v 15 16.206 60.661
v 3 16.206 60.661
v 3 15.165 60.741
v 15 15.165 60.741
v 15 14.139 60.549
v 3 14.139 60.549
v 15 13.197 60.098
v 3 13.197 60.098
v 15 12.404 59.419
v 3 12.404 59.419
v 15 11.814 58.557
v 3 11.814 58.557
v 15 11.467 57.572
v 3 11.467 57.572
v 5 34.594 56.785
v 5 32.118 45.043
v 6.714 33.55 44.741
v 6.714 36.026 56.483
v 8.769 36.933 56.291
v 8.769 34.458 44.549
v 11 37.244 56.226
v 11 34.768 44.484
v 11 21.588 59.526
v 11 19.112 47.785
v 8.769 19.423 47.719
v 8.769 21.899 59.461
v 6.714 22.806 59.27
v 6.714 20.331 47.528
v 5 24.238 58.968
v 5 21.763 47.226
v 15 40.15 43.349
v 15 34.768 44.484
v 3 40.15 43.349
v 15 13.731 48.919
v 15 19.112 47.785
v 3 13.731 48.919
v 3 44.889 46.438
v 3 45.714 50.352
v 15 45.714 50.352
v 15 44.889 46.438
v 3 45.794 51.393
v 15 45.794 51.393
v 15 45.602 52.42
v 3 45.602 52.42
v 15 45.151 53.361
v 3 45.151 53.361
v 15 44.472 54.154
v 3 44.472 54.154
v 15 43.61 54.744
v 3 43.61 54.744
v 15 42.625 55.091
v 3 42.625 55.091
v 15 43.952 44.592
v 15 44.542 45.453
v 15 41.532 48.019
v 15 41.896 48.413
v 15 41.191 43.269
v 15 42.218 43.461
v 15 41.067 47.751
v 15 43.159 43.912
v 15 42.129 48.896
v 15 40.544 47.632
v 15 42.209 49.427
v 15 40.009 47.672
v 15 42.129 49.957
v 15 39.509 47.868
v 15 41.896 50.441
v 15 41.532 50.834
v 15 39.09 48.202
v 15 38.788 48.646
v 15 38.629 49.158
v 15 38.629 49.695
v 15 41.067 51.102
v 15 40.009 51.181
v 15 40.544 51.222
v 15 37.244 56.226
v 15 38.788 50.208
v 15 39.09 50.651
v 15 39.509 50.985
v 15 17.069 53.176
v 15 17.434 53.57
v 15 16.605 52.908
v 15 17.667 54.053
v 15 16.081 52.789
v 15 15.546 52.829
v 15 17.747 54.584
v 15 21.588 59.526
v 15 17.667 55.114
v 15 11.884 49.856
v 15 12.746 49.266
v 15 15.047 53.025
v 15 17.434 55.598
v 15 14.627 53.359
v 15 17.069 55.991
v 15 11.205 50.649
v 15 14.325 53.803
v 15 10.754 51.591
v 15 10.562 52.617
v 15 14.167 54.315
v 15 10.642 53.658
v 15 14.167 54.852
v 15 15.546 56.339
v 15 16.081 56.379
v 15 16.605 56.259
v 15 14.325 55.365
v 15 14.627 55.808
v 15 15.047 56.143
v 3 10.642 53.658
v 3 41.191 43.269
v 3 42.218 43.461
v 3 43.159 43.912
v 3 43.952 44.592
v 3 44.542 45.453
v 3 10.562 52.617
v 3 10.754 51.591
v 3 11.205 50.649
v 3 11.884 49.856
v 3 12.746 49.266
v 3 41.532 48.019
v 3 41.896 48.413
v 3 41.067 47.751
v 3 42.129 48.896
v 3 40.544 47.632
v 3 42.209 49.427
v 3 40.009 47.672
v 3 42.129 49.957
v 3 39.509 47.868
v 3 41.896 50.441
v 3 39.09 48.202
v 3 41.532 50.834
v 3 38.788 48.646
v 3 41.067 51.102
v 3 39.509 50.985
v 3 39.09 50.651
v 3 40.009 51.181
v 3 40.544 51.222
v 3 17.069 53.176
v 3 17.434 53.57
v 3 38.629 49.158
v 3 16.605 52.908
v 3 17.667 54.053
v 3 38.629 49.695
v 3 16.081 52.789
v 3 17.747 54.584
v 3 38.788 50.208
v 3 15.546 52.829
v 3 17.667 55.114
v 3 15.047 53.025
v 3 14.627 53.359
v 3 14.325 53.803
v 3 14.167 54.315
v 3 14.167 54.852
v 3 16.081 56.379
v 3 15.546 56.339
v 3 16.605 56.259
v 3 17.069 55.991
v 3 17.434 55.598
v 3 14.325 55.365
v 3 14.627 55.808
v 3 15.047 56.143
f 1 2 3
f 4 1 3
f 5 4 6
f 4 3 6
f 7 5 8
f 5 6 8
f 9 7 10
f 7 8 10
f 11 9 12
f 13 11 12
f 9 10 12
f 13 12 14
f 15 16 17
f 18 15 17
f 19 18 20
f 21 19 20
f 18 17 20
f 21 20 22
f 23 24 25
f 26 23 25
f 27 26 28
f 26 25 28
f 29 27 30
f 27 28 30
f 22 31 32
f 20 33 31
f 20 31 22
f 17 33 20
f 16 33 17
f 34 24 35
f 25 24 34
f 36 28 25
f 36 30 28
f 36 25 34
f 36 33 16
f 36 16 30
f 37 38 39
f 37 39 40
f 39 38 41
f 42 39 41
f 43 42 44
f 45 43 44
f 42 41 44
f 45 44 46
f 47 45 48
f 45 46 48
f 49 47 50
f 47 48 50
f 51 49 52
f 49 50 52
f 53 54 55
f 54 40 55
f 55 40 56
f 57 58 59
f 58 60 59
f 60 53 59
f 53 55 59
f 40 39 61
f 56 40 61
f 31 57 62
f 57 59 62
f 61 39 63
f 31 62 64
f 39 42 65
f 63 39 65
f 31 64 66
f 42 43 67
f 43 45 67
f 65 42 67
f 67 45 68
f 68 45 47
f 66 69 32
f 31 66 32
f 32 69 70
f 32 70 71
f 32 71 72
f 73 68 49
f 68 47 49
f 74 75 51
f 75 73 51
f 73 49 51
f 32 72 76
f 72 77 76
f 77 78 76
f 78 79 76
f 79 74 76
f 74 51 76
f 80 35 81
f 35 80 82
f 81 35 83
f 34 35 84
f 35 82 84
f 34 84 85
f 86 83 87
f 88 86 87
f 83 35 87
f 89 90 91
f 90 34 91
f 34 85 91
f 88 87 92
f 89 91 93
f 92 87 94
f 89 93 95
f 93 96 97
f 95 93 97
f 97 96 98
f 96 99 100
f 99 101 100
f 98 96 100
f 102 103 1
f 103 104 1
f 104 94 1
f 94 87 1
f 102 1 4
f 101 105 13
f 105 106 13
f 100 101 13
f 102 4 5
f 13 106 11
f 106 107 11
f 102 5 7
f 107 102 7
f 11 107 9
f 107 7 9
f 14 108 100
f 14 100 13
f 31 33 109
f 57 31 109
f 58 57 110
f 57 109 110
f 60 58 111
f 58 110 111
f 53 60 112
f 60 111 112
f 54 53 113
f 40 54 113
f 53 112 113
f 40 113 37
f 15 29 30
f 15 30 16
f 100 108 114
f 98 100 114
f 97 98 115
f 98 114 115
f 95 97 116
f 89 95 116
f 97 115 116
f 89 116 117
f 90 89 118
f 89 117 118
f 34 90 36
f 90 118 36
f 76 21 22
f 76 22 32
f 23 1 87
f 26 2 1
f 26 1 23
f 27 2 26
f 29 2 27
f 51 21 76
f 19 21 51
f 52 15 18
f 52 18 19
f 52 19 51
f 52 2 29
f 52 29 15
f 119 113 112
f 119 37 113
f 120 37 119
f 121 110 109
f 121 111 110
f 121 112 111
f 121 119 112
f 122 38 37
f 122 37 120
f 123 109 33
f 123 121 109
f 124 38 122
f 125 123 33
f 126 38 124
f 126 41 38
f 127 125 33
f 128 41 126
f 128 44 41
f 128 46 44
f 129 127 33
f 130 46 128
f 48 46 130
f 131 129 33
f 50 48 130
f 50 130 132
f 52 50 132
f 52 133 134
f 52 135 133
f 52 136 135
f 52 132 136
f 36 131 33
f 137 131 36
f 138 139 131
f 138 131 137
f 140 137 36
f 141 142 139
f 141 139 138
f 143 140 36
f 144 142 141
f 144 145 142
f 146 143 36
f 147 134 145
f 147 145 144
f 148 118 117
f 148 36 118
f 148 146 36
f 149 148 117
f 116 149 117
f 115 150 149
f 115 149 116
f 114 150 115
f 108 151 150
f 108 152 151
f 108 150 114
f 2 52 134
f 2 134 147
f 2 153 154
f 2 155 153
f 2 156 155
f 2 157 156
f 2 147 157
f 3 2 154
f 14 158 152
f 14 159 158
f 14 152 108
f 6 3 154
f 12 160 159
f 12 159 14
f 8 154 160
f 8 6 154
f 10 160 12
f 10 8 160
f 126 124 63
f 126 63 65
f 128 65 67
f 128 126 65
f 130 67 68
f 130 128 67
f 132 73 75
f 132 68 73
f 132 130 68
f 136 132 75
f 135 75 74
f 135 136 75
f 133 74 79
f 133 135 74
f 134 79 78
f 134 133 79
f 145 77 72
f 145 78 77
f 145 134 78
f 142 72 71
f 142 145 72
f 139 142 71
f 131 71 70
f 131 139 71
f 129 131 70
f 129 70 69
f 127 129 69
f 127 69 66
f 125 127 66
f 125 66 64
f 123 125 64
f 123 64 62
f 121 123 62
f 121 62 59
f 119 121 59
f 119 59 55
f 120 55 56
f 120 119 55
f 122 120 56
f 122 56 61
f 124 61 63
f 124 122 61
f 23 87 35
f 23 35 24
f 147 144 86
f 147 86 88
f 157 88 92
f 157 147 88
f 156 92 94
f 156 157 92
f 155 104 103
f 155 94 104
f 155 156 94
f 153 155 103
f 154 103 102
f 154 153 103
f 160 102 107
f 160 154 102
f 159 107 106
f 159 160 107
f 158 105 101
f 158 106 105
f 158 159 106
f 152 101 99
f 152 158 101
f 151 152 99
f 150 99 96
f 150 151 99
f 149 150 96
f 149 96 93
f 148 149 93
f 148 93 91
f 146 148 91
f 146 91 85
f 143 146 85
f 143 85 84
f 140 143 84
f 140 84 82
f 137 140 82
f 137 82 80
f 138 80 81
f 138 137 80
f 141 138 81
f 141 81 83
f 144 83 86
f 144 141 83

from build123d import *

# Parameters (mm, degrees)
PAD007_DEPTH    = 12
SKETCH017_R     = 1.8
HOLE004_DEPTH   = 15.001
POCKET003_DEPTH = 18.1900462152


with BuildPart() as part:
    # Sketch016 → Pad007 (new body)
    with BuildSketch(Plane.YZ.offset(3)):
        with BuildLine():
            Line((40.1500266983, 43.3493812581), (13.7307513645, 48.919111129))
            ThreePointArc((10.6419298144, 53.6582230111), (11.2048383818, 50.6489511812), (13.7307513645, 48.919111129))
            Line((10.6419298144, 53.6582230111), (11.4670749804, 57.5721897273))
            ThreePointArc((16.2061868626, 60.6610112773), (13.1969150326, 60.0981027099), (11.4670749804, 57.5721897273))
            Line((16.2061868626, 60.6610112773), (42.6254621965, 55.0912814065))
            ThreePointArc((45.7142837465, 50.3521695243), (45.1513751791, 53.3614413543), (42.6254621965, 55.0912814065))
            Line((45.7142837465, 50.3521695243), (44.8891385805, 46.4382028082))
            ThreePointArc((40.1500266983, 43.3493812581), (43.1592985283, 43.9122898256), (44.8891385805, 46.4382028082))
        make_face()
    extrude(amount=PAD007_DEPTH)

    # Sketch017 → Hole004 (cut, through all)
    with BuildSketch(Plane.YZ):
        with Locations((15.9469607926, 54.5837749116)):
            Circle(SKETCH017_R)
        with Locations((40.4092527683, 49.4266176238)):
            Circle(SKETCH017_R)
    extrude(amount=HOLE004_DEPTH, mode=Mode.SUBTRACT)

    # Sketch018 (on ShapeBinder) → Pocket003 (cut, through all)
    with BuildSketch(Plane(origin=(0, 10.4585930571, 49.6089498031), x_dir=(0, 0.978491679, -0.2062862915), z_dir=(0, -0.2062862915, -0.978491679))):
        with BuildLine():
            Line((8.8440839381, 21), (8.8440839381, 11))
            ThreePointArc((8.8440839381, 11), (9.5525813159, 7.7084973779), (11.5525813159, 5))
            Line((11.5525813159, 5), (22.1355865602, 5))
            ThreePointArc((22.1355865602, 5), (24.1355865602, 7.7084973779), (24.8440839381, 11))
            Line((24.8440839381, 11), (24.8440839381, 21))
            Line((24.8440839381, 21), (8.8440839381, 21))
        make_face()
    extrude(amount=-POCKET003_DEPTH, mode=Mode.SUBTRACT)


solid = part.part
